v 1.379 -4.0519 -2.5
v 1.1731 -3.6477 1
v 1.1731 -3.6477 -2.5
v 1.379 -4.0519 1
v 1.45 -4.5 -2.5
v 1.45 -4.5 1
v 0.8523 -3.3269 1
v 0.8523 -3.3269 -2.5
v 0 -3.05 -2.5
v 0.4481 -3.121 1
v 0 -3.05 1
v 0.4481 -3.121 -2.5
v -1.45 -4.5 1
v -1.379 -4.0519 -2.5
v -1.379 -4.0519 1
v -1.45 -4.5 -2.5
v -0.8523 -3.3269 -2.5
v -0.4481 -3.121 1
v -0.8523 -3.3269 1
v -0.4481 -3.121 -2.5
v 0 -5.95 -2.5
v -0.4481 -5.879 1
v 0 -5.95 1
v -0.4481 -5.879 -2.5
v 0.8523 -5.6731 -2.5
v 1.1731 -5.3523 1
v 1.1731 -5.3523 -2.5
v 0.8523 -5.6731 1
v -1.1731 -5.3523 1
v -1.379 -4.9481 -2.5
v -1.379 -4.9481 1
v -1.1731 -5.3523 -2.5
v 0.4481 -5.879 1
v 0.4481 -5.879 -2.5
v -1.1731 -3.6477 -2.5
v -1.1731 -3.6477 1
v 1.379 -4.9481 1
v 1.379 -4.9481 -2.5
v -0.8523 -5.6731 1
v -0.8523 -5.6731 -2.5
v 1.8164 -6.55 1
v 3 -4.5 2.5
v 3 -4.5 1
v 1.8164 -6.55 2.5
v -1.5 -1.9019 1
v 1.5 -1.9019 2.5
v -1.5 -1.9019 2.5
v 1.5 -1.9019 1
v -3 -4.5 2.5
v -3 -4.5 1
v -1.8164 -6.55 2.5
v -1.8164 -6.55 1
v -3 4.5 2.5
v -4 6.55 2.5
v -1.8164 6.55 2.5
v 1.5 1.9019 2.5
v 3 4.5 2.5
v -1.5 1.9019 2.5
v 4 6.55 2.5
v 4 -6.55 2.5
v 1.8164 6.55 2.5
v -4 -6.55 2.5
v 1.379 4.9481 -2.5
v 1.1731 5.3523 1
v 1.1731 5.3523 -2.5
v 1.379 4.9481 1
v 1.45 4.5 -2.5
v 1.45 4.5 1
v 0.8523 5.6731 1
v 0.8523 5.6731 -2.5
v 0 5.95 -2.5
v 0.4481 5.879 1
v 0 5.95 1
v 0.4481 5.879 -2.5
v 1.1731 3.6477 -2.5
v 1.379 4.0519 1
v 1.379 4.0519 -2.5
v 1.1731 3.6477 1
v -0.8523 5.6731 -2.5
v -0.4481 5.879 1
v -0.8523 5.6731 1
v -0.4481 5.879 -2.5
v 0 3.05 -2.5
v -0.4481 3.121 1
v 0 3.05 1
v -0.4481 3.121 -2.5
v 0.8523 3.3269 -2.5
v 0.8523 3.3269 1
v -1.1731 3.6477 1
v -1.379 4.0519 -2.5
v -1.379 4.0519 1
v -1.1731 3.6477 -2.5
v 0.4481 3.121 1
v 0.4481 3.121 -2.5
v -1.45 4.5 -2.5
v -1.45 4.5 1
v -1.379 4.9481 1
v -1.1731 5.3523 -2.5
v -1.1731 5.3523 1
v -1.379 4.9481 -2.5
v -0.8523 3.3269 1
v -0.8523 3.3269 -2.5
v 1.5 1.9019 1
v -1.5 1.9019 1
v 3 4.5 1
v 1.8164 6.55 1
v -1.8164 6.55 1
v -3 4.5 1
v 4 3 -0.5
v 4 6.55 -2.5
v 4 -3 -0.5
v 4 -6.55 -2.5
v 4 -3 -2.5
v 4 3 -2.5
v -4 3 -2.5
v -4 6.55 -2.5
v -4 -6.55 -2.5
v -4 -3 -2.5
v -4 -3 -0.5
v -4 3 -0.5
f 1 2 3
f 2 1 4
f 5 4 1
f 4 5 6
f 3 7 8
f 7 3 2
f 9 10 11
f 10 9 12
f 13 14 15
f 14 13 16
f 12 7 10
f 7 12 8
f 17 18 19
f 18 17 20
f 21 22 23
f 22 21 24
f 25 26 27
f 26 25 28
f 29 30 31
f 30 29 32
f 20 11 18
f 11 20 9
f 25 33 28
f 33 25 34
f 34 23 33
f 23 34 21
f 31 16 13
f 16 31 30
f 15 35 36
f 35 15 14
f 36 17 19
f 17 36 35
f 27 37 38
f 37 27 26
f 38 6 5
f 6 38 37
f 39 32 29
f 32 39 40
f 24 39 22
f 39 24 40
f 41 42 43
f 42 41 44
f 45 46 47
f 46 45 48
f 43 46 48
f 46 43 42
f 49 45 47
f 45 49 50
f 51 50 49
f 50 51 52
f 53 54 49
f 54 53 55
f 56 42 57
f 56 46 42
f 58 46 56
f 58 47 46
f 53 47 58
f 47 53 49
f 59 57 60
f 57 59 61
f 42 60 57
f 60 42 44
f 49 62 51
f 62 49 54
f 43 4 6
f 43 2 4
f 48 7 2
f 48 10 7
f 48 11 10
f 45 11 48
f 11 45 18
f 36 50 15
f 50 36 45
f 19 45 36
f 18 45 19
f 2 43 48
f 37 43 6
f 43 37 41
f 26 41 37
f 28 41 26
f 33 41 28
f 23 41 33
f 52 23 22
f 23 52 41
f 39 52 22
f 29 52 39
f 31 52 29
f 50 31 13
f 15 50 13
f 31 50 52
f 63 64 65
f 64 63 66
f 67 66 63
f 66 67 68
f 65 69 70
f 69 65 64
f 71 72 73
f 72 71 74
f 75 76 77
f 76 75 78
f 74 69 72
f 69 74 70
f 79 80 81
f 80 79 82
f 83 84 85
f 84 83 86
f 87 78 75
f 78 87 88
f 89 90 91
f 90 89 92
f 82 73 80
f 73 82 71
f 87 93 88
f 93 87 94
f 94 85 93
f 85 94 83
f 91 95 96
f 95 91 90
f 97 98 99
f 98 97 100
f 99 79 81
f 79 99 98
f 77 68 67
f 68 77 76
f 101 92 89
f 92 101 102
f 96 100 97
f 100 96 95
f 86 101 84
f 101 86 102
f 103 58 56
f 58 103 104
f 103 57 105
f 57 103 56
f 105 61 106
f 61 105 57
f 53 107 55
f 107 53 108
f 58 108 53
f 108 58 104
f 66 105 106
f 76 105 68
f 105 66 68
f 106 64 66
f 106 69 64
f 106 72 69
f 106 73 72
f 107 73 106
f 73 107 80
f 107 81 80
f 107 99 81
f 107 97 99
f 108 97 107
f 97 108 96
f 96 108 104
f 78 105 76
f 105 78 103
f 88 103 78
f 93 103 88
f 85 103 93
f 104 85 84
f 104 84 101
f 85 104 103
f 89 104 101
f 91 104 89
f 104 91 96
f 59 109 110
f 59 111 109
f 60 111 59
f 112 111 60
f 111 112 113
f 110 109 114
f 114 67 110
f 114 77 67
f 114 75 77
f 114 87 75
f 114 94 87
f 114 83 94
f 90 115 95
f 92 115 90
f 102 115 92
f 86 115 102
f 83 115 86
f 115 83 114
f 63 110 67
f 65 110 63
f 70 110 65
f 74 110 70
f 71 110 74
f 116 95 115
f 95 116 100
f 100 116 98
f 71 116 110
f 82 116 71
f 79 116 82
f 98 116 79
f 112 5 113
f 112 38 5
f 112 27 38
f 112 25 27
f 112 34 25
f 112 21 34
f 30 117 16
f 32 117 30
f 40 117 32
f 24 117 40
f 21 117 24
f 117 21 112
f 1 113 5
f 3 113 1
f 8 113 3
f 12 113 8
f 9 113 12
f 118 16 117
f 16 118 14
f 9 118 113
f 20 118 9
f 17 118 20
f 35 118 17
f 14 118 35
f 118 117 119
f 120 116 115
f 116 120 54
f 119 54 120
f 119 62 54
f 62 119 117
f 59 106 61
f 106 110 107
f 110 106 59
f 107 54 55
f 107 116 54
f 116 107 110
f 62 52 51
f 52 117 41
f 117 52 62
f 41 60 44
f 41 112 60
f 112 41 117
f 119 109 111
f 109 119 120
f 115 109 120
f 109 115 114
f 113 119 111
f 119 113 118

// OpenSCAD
// Current PCB dimensions
current_pcb_length = 31.5;
current_pcb_width = 13.1;
current_pcb_height = 1;
current_pcb_hole_offset_length = 17;
current_pcb_hole_offset_width = 2.9/2 + 0.6;
current_pcb_hole_diameter = 2.9;

// Current PCB spacer dimensions
current_pcb_spacer_height = 2;
current_pcb_input_offset = 5- current_pcb_length / 2;
current_pcb_sense_offset = current_pcb_length / 2 - 3;
current_pcb_contact_width = 8;
current_pcb_contact_length = 3;

// Current PCB mounting clamp dimensions
current_pcb_clamp_length = 8;
current_pcb_clamp_height = 5;
current_pcb_nut_diameter = 6;
current_pcb_nut_height = 1.5;
current_pcb_clamp_cutout_width = 6;
current_pcb_clamp_cutout_height = 2;

// This module generates its children in the positions of the current measurement PCB mounting holes
module current_pcb_holes(){
    for(i = [-current_pcb_width/2 + current_pcb_hole_offset_width, current_pcb_width/2 - current_pcb_hole_offset_width]){
        translate([current_pcb_length/2 - current_pcb_hole_offset_length, i, 0]){
            children();
        }
    }
}

// This module approximates the current measurement PCB, for testing fit
module current_pcb(){
    difference(){
        cube([current_pcb_length, current_pcb_width, current_pcb_height], center=true);
        
        current_pcb_holes(){
            cylinder(d=current_pcb_hole_diameter, h=10, center=true, $fn=20);
        }
    }
}

// This module generates a spacer for supporting the current PCB against the side of the enclosure
module current_pcb_spacer(){
    difference(){
        cube([current_pcb_length, current_pcb_width, current_pcb_spacer_height], center=true);
        
        current_pcb_holes(){
            cylinder(d=current_pcb_hole_diameter, h=10, center=true, $fn=20);
        }
        
        translate([current_pcb_input_offset, 0, 0]){
            cube([current_pcb_contact_length, current_pcb_contact_width, current_pcb_spacer_height * 2], center=true);
        }
        translate([current_pcb_sense_offset, 0, 0]){
            cube([current_pcb_contact_length, current_pcb_contact_width, current_pcb_spacer_height * 2], center=true);
        }
    }
}

// This module generates a clamp to allow the current PCB to be bolted down without the nuts damaging the components on the board
module current_pcb_clamp(){
    difference(){
        cube([current_pcb_clamp_length, current_pcb_width, current_pcb_clamp_height], center=true);
        
        translate([0, 0, current_pcb_clamp_cutout_height/2 - current_pcb_clamp_height/2 - 0.5]){
            cube([current_pcb_clamp_length + 1, current_pcb_clamp_cutout_width, current_pcb_clamp_cutout_height + 1], center=true);
        }
        
        for(i = [-current_pcb_width/2 + current_pcb_hole_offset_width, current_pcb_width/2 - current_pcb_hole_offset_width]){
            translate([0, i, 0]){
                cylinder(d=current_pcb_hole_diameter, h=10, center=true, $fn=20);
                translate([0, 0, current_pcb_clamp_height/2 - current_pcb_nut_height/2]){
                    cylinder(d=current_pcb_nut_diameter, h=current_pcb_nut_height, center=true, $fn=6);
                }
            }
        }
    }
}
//current_pcb();
current_pcb_clamp();
//current_pcb_spacer();
